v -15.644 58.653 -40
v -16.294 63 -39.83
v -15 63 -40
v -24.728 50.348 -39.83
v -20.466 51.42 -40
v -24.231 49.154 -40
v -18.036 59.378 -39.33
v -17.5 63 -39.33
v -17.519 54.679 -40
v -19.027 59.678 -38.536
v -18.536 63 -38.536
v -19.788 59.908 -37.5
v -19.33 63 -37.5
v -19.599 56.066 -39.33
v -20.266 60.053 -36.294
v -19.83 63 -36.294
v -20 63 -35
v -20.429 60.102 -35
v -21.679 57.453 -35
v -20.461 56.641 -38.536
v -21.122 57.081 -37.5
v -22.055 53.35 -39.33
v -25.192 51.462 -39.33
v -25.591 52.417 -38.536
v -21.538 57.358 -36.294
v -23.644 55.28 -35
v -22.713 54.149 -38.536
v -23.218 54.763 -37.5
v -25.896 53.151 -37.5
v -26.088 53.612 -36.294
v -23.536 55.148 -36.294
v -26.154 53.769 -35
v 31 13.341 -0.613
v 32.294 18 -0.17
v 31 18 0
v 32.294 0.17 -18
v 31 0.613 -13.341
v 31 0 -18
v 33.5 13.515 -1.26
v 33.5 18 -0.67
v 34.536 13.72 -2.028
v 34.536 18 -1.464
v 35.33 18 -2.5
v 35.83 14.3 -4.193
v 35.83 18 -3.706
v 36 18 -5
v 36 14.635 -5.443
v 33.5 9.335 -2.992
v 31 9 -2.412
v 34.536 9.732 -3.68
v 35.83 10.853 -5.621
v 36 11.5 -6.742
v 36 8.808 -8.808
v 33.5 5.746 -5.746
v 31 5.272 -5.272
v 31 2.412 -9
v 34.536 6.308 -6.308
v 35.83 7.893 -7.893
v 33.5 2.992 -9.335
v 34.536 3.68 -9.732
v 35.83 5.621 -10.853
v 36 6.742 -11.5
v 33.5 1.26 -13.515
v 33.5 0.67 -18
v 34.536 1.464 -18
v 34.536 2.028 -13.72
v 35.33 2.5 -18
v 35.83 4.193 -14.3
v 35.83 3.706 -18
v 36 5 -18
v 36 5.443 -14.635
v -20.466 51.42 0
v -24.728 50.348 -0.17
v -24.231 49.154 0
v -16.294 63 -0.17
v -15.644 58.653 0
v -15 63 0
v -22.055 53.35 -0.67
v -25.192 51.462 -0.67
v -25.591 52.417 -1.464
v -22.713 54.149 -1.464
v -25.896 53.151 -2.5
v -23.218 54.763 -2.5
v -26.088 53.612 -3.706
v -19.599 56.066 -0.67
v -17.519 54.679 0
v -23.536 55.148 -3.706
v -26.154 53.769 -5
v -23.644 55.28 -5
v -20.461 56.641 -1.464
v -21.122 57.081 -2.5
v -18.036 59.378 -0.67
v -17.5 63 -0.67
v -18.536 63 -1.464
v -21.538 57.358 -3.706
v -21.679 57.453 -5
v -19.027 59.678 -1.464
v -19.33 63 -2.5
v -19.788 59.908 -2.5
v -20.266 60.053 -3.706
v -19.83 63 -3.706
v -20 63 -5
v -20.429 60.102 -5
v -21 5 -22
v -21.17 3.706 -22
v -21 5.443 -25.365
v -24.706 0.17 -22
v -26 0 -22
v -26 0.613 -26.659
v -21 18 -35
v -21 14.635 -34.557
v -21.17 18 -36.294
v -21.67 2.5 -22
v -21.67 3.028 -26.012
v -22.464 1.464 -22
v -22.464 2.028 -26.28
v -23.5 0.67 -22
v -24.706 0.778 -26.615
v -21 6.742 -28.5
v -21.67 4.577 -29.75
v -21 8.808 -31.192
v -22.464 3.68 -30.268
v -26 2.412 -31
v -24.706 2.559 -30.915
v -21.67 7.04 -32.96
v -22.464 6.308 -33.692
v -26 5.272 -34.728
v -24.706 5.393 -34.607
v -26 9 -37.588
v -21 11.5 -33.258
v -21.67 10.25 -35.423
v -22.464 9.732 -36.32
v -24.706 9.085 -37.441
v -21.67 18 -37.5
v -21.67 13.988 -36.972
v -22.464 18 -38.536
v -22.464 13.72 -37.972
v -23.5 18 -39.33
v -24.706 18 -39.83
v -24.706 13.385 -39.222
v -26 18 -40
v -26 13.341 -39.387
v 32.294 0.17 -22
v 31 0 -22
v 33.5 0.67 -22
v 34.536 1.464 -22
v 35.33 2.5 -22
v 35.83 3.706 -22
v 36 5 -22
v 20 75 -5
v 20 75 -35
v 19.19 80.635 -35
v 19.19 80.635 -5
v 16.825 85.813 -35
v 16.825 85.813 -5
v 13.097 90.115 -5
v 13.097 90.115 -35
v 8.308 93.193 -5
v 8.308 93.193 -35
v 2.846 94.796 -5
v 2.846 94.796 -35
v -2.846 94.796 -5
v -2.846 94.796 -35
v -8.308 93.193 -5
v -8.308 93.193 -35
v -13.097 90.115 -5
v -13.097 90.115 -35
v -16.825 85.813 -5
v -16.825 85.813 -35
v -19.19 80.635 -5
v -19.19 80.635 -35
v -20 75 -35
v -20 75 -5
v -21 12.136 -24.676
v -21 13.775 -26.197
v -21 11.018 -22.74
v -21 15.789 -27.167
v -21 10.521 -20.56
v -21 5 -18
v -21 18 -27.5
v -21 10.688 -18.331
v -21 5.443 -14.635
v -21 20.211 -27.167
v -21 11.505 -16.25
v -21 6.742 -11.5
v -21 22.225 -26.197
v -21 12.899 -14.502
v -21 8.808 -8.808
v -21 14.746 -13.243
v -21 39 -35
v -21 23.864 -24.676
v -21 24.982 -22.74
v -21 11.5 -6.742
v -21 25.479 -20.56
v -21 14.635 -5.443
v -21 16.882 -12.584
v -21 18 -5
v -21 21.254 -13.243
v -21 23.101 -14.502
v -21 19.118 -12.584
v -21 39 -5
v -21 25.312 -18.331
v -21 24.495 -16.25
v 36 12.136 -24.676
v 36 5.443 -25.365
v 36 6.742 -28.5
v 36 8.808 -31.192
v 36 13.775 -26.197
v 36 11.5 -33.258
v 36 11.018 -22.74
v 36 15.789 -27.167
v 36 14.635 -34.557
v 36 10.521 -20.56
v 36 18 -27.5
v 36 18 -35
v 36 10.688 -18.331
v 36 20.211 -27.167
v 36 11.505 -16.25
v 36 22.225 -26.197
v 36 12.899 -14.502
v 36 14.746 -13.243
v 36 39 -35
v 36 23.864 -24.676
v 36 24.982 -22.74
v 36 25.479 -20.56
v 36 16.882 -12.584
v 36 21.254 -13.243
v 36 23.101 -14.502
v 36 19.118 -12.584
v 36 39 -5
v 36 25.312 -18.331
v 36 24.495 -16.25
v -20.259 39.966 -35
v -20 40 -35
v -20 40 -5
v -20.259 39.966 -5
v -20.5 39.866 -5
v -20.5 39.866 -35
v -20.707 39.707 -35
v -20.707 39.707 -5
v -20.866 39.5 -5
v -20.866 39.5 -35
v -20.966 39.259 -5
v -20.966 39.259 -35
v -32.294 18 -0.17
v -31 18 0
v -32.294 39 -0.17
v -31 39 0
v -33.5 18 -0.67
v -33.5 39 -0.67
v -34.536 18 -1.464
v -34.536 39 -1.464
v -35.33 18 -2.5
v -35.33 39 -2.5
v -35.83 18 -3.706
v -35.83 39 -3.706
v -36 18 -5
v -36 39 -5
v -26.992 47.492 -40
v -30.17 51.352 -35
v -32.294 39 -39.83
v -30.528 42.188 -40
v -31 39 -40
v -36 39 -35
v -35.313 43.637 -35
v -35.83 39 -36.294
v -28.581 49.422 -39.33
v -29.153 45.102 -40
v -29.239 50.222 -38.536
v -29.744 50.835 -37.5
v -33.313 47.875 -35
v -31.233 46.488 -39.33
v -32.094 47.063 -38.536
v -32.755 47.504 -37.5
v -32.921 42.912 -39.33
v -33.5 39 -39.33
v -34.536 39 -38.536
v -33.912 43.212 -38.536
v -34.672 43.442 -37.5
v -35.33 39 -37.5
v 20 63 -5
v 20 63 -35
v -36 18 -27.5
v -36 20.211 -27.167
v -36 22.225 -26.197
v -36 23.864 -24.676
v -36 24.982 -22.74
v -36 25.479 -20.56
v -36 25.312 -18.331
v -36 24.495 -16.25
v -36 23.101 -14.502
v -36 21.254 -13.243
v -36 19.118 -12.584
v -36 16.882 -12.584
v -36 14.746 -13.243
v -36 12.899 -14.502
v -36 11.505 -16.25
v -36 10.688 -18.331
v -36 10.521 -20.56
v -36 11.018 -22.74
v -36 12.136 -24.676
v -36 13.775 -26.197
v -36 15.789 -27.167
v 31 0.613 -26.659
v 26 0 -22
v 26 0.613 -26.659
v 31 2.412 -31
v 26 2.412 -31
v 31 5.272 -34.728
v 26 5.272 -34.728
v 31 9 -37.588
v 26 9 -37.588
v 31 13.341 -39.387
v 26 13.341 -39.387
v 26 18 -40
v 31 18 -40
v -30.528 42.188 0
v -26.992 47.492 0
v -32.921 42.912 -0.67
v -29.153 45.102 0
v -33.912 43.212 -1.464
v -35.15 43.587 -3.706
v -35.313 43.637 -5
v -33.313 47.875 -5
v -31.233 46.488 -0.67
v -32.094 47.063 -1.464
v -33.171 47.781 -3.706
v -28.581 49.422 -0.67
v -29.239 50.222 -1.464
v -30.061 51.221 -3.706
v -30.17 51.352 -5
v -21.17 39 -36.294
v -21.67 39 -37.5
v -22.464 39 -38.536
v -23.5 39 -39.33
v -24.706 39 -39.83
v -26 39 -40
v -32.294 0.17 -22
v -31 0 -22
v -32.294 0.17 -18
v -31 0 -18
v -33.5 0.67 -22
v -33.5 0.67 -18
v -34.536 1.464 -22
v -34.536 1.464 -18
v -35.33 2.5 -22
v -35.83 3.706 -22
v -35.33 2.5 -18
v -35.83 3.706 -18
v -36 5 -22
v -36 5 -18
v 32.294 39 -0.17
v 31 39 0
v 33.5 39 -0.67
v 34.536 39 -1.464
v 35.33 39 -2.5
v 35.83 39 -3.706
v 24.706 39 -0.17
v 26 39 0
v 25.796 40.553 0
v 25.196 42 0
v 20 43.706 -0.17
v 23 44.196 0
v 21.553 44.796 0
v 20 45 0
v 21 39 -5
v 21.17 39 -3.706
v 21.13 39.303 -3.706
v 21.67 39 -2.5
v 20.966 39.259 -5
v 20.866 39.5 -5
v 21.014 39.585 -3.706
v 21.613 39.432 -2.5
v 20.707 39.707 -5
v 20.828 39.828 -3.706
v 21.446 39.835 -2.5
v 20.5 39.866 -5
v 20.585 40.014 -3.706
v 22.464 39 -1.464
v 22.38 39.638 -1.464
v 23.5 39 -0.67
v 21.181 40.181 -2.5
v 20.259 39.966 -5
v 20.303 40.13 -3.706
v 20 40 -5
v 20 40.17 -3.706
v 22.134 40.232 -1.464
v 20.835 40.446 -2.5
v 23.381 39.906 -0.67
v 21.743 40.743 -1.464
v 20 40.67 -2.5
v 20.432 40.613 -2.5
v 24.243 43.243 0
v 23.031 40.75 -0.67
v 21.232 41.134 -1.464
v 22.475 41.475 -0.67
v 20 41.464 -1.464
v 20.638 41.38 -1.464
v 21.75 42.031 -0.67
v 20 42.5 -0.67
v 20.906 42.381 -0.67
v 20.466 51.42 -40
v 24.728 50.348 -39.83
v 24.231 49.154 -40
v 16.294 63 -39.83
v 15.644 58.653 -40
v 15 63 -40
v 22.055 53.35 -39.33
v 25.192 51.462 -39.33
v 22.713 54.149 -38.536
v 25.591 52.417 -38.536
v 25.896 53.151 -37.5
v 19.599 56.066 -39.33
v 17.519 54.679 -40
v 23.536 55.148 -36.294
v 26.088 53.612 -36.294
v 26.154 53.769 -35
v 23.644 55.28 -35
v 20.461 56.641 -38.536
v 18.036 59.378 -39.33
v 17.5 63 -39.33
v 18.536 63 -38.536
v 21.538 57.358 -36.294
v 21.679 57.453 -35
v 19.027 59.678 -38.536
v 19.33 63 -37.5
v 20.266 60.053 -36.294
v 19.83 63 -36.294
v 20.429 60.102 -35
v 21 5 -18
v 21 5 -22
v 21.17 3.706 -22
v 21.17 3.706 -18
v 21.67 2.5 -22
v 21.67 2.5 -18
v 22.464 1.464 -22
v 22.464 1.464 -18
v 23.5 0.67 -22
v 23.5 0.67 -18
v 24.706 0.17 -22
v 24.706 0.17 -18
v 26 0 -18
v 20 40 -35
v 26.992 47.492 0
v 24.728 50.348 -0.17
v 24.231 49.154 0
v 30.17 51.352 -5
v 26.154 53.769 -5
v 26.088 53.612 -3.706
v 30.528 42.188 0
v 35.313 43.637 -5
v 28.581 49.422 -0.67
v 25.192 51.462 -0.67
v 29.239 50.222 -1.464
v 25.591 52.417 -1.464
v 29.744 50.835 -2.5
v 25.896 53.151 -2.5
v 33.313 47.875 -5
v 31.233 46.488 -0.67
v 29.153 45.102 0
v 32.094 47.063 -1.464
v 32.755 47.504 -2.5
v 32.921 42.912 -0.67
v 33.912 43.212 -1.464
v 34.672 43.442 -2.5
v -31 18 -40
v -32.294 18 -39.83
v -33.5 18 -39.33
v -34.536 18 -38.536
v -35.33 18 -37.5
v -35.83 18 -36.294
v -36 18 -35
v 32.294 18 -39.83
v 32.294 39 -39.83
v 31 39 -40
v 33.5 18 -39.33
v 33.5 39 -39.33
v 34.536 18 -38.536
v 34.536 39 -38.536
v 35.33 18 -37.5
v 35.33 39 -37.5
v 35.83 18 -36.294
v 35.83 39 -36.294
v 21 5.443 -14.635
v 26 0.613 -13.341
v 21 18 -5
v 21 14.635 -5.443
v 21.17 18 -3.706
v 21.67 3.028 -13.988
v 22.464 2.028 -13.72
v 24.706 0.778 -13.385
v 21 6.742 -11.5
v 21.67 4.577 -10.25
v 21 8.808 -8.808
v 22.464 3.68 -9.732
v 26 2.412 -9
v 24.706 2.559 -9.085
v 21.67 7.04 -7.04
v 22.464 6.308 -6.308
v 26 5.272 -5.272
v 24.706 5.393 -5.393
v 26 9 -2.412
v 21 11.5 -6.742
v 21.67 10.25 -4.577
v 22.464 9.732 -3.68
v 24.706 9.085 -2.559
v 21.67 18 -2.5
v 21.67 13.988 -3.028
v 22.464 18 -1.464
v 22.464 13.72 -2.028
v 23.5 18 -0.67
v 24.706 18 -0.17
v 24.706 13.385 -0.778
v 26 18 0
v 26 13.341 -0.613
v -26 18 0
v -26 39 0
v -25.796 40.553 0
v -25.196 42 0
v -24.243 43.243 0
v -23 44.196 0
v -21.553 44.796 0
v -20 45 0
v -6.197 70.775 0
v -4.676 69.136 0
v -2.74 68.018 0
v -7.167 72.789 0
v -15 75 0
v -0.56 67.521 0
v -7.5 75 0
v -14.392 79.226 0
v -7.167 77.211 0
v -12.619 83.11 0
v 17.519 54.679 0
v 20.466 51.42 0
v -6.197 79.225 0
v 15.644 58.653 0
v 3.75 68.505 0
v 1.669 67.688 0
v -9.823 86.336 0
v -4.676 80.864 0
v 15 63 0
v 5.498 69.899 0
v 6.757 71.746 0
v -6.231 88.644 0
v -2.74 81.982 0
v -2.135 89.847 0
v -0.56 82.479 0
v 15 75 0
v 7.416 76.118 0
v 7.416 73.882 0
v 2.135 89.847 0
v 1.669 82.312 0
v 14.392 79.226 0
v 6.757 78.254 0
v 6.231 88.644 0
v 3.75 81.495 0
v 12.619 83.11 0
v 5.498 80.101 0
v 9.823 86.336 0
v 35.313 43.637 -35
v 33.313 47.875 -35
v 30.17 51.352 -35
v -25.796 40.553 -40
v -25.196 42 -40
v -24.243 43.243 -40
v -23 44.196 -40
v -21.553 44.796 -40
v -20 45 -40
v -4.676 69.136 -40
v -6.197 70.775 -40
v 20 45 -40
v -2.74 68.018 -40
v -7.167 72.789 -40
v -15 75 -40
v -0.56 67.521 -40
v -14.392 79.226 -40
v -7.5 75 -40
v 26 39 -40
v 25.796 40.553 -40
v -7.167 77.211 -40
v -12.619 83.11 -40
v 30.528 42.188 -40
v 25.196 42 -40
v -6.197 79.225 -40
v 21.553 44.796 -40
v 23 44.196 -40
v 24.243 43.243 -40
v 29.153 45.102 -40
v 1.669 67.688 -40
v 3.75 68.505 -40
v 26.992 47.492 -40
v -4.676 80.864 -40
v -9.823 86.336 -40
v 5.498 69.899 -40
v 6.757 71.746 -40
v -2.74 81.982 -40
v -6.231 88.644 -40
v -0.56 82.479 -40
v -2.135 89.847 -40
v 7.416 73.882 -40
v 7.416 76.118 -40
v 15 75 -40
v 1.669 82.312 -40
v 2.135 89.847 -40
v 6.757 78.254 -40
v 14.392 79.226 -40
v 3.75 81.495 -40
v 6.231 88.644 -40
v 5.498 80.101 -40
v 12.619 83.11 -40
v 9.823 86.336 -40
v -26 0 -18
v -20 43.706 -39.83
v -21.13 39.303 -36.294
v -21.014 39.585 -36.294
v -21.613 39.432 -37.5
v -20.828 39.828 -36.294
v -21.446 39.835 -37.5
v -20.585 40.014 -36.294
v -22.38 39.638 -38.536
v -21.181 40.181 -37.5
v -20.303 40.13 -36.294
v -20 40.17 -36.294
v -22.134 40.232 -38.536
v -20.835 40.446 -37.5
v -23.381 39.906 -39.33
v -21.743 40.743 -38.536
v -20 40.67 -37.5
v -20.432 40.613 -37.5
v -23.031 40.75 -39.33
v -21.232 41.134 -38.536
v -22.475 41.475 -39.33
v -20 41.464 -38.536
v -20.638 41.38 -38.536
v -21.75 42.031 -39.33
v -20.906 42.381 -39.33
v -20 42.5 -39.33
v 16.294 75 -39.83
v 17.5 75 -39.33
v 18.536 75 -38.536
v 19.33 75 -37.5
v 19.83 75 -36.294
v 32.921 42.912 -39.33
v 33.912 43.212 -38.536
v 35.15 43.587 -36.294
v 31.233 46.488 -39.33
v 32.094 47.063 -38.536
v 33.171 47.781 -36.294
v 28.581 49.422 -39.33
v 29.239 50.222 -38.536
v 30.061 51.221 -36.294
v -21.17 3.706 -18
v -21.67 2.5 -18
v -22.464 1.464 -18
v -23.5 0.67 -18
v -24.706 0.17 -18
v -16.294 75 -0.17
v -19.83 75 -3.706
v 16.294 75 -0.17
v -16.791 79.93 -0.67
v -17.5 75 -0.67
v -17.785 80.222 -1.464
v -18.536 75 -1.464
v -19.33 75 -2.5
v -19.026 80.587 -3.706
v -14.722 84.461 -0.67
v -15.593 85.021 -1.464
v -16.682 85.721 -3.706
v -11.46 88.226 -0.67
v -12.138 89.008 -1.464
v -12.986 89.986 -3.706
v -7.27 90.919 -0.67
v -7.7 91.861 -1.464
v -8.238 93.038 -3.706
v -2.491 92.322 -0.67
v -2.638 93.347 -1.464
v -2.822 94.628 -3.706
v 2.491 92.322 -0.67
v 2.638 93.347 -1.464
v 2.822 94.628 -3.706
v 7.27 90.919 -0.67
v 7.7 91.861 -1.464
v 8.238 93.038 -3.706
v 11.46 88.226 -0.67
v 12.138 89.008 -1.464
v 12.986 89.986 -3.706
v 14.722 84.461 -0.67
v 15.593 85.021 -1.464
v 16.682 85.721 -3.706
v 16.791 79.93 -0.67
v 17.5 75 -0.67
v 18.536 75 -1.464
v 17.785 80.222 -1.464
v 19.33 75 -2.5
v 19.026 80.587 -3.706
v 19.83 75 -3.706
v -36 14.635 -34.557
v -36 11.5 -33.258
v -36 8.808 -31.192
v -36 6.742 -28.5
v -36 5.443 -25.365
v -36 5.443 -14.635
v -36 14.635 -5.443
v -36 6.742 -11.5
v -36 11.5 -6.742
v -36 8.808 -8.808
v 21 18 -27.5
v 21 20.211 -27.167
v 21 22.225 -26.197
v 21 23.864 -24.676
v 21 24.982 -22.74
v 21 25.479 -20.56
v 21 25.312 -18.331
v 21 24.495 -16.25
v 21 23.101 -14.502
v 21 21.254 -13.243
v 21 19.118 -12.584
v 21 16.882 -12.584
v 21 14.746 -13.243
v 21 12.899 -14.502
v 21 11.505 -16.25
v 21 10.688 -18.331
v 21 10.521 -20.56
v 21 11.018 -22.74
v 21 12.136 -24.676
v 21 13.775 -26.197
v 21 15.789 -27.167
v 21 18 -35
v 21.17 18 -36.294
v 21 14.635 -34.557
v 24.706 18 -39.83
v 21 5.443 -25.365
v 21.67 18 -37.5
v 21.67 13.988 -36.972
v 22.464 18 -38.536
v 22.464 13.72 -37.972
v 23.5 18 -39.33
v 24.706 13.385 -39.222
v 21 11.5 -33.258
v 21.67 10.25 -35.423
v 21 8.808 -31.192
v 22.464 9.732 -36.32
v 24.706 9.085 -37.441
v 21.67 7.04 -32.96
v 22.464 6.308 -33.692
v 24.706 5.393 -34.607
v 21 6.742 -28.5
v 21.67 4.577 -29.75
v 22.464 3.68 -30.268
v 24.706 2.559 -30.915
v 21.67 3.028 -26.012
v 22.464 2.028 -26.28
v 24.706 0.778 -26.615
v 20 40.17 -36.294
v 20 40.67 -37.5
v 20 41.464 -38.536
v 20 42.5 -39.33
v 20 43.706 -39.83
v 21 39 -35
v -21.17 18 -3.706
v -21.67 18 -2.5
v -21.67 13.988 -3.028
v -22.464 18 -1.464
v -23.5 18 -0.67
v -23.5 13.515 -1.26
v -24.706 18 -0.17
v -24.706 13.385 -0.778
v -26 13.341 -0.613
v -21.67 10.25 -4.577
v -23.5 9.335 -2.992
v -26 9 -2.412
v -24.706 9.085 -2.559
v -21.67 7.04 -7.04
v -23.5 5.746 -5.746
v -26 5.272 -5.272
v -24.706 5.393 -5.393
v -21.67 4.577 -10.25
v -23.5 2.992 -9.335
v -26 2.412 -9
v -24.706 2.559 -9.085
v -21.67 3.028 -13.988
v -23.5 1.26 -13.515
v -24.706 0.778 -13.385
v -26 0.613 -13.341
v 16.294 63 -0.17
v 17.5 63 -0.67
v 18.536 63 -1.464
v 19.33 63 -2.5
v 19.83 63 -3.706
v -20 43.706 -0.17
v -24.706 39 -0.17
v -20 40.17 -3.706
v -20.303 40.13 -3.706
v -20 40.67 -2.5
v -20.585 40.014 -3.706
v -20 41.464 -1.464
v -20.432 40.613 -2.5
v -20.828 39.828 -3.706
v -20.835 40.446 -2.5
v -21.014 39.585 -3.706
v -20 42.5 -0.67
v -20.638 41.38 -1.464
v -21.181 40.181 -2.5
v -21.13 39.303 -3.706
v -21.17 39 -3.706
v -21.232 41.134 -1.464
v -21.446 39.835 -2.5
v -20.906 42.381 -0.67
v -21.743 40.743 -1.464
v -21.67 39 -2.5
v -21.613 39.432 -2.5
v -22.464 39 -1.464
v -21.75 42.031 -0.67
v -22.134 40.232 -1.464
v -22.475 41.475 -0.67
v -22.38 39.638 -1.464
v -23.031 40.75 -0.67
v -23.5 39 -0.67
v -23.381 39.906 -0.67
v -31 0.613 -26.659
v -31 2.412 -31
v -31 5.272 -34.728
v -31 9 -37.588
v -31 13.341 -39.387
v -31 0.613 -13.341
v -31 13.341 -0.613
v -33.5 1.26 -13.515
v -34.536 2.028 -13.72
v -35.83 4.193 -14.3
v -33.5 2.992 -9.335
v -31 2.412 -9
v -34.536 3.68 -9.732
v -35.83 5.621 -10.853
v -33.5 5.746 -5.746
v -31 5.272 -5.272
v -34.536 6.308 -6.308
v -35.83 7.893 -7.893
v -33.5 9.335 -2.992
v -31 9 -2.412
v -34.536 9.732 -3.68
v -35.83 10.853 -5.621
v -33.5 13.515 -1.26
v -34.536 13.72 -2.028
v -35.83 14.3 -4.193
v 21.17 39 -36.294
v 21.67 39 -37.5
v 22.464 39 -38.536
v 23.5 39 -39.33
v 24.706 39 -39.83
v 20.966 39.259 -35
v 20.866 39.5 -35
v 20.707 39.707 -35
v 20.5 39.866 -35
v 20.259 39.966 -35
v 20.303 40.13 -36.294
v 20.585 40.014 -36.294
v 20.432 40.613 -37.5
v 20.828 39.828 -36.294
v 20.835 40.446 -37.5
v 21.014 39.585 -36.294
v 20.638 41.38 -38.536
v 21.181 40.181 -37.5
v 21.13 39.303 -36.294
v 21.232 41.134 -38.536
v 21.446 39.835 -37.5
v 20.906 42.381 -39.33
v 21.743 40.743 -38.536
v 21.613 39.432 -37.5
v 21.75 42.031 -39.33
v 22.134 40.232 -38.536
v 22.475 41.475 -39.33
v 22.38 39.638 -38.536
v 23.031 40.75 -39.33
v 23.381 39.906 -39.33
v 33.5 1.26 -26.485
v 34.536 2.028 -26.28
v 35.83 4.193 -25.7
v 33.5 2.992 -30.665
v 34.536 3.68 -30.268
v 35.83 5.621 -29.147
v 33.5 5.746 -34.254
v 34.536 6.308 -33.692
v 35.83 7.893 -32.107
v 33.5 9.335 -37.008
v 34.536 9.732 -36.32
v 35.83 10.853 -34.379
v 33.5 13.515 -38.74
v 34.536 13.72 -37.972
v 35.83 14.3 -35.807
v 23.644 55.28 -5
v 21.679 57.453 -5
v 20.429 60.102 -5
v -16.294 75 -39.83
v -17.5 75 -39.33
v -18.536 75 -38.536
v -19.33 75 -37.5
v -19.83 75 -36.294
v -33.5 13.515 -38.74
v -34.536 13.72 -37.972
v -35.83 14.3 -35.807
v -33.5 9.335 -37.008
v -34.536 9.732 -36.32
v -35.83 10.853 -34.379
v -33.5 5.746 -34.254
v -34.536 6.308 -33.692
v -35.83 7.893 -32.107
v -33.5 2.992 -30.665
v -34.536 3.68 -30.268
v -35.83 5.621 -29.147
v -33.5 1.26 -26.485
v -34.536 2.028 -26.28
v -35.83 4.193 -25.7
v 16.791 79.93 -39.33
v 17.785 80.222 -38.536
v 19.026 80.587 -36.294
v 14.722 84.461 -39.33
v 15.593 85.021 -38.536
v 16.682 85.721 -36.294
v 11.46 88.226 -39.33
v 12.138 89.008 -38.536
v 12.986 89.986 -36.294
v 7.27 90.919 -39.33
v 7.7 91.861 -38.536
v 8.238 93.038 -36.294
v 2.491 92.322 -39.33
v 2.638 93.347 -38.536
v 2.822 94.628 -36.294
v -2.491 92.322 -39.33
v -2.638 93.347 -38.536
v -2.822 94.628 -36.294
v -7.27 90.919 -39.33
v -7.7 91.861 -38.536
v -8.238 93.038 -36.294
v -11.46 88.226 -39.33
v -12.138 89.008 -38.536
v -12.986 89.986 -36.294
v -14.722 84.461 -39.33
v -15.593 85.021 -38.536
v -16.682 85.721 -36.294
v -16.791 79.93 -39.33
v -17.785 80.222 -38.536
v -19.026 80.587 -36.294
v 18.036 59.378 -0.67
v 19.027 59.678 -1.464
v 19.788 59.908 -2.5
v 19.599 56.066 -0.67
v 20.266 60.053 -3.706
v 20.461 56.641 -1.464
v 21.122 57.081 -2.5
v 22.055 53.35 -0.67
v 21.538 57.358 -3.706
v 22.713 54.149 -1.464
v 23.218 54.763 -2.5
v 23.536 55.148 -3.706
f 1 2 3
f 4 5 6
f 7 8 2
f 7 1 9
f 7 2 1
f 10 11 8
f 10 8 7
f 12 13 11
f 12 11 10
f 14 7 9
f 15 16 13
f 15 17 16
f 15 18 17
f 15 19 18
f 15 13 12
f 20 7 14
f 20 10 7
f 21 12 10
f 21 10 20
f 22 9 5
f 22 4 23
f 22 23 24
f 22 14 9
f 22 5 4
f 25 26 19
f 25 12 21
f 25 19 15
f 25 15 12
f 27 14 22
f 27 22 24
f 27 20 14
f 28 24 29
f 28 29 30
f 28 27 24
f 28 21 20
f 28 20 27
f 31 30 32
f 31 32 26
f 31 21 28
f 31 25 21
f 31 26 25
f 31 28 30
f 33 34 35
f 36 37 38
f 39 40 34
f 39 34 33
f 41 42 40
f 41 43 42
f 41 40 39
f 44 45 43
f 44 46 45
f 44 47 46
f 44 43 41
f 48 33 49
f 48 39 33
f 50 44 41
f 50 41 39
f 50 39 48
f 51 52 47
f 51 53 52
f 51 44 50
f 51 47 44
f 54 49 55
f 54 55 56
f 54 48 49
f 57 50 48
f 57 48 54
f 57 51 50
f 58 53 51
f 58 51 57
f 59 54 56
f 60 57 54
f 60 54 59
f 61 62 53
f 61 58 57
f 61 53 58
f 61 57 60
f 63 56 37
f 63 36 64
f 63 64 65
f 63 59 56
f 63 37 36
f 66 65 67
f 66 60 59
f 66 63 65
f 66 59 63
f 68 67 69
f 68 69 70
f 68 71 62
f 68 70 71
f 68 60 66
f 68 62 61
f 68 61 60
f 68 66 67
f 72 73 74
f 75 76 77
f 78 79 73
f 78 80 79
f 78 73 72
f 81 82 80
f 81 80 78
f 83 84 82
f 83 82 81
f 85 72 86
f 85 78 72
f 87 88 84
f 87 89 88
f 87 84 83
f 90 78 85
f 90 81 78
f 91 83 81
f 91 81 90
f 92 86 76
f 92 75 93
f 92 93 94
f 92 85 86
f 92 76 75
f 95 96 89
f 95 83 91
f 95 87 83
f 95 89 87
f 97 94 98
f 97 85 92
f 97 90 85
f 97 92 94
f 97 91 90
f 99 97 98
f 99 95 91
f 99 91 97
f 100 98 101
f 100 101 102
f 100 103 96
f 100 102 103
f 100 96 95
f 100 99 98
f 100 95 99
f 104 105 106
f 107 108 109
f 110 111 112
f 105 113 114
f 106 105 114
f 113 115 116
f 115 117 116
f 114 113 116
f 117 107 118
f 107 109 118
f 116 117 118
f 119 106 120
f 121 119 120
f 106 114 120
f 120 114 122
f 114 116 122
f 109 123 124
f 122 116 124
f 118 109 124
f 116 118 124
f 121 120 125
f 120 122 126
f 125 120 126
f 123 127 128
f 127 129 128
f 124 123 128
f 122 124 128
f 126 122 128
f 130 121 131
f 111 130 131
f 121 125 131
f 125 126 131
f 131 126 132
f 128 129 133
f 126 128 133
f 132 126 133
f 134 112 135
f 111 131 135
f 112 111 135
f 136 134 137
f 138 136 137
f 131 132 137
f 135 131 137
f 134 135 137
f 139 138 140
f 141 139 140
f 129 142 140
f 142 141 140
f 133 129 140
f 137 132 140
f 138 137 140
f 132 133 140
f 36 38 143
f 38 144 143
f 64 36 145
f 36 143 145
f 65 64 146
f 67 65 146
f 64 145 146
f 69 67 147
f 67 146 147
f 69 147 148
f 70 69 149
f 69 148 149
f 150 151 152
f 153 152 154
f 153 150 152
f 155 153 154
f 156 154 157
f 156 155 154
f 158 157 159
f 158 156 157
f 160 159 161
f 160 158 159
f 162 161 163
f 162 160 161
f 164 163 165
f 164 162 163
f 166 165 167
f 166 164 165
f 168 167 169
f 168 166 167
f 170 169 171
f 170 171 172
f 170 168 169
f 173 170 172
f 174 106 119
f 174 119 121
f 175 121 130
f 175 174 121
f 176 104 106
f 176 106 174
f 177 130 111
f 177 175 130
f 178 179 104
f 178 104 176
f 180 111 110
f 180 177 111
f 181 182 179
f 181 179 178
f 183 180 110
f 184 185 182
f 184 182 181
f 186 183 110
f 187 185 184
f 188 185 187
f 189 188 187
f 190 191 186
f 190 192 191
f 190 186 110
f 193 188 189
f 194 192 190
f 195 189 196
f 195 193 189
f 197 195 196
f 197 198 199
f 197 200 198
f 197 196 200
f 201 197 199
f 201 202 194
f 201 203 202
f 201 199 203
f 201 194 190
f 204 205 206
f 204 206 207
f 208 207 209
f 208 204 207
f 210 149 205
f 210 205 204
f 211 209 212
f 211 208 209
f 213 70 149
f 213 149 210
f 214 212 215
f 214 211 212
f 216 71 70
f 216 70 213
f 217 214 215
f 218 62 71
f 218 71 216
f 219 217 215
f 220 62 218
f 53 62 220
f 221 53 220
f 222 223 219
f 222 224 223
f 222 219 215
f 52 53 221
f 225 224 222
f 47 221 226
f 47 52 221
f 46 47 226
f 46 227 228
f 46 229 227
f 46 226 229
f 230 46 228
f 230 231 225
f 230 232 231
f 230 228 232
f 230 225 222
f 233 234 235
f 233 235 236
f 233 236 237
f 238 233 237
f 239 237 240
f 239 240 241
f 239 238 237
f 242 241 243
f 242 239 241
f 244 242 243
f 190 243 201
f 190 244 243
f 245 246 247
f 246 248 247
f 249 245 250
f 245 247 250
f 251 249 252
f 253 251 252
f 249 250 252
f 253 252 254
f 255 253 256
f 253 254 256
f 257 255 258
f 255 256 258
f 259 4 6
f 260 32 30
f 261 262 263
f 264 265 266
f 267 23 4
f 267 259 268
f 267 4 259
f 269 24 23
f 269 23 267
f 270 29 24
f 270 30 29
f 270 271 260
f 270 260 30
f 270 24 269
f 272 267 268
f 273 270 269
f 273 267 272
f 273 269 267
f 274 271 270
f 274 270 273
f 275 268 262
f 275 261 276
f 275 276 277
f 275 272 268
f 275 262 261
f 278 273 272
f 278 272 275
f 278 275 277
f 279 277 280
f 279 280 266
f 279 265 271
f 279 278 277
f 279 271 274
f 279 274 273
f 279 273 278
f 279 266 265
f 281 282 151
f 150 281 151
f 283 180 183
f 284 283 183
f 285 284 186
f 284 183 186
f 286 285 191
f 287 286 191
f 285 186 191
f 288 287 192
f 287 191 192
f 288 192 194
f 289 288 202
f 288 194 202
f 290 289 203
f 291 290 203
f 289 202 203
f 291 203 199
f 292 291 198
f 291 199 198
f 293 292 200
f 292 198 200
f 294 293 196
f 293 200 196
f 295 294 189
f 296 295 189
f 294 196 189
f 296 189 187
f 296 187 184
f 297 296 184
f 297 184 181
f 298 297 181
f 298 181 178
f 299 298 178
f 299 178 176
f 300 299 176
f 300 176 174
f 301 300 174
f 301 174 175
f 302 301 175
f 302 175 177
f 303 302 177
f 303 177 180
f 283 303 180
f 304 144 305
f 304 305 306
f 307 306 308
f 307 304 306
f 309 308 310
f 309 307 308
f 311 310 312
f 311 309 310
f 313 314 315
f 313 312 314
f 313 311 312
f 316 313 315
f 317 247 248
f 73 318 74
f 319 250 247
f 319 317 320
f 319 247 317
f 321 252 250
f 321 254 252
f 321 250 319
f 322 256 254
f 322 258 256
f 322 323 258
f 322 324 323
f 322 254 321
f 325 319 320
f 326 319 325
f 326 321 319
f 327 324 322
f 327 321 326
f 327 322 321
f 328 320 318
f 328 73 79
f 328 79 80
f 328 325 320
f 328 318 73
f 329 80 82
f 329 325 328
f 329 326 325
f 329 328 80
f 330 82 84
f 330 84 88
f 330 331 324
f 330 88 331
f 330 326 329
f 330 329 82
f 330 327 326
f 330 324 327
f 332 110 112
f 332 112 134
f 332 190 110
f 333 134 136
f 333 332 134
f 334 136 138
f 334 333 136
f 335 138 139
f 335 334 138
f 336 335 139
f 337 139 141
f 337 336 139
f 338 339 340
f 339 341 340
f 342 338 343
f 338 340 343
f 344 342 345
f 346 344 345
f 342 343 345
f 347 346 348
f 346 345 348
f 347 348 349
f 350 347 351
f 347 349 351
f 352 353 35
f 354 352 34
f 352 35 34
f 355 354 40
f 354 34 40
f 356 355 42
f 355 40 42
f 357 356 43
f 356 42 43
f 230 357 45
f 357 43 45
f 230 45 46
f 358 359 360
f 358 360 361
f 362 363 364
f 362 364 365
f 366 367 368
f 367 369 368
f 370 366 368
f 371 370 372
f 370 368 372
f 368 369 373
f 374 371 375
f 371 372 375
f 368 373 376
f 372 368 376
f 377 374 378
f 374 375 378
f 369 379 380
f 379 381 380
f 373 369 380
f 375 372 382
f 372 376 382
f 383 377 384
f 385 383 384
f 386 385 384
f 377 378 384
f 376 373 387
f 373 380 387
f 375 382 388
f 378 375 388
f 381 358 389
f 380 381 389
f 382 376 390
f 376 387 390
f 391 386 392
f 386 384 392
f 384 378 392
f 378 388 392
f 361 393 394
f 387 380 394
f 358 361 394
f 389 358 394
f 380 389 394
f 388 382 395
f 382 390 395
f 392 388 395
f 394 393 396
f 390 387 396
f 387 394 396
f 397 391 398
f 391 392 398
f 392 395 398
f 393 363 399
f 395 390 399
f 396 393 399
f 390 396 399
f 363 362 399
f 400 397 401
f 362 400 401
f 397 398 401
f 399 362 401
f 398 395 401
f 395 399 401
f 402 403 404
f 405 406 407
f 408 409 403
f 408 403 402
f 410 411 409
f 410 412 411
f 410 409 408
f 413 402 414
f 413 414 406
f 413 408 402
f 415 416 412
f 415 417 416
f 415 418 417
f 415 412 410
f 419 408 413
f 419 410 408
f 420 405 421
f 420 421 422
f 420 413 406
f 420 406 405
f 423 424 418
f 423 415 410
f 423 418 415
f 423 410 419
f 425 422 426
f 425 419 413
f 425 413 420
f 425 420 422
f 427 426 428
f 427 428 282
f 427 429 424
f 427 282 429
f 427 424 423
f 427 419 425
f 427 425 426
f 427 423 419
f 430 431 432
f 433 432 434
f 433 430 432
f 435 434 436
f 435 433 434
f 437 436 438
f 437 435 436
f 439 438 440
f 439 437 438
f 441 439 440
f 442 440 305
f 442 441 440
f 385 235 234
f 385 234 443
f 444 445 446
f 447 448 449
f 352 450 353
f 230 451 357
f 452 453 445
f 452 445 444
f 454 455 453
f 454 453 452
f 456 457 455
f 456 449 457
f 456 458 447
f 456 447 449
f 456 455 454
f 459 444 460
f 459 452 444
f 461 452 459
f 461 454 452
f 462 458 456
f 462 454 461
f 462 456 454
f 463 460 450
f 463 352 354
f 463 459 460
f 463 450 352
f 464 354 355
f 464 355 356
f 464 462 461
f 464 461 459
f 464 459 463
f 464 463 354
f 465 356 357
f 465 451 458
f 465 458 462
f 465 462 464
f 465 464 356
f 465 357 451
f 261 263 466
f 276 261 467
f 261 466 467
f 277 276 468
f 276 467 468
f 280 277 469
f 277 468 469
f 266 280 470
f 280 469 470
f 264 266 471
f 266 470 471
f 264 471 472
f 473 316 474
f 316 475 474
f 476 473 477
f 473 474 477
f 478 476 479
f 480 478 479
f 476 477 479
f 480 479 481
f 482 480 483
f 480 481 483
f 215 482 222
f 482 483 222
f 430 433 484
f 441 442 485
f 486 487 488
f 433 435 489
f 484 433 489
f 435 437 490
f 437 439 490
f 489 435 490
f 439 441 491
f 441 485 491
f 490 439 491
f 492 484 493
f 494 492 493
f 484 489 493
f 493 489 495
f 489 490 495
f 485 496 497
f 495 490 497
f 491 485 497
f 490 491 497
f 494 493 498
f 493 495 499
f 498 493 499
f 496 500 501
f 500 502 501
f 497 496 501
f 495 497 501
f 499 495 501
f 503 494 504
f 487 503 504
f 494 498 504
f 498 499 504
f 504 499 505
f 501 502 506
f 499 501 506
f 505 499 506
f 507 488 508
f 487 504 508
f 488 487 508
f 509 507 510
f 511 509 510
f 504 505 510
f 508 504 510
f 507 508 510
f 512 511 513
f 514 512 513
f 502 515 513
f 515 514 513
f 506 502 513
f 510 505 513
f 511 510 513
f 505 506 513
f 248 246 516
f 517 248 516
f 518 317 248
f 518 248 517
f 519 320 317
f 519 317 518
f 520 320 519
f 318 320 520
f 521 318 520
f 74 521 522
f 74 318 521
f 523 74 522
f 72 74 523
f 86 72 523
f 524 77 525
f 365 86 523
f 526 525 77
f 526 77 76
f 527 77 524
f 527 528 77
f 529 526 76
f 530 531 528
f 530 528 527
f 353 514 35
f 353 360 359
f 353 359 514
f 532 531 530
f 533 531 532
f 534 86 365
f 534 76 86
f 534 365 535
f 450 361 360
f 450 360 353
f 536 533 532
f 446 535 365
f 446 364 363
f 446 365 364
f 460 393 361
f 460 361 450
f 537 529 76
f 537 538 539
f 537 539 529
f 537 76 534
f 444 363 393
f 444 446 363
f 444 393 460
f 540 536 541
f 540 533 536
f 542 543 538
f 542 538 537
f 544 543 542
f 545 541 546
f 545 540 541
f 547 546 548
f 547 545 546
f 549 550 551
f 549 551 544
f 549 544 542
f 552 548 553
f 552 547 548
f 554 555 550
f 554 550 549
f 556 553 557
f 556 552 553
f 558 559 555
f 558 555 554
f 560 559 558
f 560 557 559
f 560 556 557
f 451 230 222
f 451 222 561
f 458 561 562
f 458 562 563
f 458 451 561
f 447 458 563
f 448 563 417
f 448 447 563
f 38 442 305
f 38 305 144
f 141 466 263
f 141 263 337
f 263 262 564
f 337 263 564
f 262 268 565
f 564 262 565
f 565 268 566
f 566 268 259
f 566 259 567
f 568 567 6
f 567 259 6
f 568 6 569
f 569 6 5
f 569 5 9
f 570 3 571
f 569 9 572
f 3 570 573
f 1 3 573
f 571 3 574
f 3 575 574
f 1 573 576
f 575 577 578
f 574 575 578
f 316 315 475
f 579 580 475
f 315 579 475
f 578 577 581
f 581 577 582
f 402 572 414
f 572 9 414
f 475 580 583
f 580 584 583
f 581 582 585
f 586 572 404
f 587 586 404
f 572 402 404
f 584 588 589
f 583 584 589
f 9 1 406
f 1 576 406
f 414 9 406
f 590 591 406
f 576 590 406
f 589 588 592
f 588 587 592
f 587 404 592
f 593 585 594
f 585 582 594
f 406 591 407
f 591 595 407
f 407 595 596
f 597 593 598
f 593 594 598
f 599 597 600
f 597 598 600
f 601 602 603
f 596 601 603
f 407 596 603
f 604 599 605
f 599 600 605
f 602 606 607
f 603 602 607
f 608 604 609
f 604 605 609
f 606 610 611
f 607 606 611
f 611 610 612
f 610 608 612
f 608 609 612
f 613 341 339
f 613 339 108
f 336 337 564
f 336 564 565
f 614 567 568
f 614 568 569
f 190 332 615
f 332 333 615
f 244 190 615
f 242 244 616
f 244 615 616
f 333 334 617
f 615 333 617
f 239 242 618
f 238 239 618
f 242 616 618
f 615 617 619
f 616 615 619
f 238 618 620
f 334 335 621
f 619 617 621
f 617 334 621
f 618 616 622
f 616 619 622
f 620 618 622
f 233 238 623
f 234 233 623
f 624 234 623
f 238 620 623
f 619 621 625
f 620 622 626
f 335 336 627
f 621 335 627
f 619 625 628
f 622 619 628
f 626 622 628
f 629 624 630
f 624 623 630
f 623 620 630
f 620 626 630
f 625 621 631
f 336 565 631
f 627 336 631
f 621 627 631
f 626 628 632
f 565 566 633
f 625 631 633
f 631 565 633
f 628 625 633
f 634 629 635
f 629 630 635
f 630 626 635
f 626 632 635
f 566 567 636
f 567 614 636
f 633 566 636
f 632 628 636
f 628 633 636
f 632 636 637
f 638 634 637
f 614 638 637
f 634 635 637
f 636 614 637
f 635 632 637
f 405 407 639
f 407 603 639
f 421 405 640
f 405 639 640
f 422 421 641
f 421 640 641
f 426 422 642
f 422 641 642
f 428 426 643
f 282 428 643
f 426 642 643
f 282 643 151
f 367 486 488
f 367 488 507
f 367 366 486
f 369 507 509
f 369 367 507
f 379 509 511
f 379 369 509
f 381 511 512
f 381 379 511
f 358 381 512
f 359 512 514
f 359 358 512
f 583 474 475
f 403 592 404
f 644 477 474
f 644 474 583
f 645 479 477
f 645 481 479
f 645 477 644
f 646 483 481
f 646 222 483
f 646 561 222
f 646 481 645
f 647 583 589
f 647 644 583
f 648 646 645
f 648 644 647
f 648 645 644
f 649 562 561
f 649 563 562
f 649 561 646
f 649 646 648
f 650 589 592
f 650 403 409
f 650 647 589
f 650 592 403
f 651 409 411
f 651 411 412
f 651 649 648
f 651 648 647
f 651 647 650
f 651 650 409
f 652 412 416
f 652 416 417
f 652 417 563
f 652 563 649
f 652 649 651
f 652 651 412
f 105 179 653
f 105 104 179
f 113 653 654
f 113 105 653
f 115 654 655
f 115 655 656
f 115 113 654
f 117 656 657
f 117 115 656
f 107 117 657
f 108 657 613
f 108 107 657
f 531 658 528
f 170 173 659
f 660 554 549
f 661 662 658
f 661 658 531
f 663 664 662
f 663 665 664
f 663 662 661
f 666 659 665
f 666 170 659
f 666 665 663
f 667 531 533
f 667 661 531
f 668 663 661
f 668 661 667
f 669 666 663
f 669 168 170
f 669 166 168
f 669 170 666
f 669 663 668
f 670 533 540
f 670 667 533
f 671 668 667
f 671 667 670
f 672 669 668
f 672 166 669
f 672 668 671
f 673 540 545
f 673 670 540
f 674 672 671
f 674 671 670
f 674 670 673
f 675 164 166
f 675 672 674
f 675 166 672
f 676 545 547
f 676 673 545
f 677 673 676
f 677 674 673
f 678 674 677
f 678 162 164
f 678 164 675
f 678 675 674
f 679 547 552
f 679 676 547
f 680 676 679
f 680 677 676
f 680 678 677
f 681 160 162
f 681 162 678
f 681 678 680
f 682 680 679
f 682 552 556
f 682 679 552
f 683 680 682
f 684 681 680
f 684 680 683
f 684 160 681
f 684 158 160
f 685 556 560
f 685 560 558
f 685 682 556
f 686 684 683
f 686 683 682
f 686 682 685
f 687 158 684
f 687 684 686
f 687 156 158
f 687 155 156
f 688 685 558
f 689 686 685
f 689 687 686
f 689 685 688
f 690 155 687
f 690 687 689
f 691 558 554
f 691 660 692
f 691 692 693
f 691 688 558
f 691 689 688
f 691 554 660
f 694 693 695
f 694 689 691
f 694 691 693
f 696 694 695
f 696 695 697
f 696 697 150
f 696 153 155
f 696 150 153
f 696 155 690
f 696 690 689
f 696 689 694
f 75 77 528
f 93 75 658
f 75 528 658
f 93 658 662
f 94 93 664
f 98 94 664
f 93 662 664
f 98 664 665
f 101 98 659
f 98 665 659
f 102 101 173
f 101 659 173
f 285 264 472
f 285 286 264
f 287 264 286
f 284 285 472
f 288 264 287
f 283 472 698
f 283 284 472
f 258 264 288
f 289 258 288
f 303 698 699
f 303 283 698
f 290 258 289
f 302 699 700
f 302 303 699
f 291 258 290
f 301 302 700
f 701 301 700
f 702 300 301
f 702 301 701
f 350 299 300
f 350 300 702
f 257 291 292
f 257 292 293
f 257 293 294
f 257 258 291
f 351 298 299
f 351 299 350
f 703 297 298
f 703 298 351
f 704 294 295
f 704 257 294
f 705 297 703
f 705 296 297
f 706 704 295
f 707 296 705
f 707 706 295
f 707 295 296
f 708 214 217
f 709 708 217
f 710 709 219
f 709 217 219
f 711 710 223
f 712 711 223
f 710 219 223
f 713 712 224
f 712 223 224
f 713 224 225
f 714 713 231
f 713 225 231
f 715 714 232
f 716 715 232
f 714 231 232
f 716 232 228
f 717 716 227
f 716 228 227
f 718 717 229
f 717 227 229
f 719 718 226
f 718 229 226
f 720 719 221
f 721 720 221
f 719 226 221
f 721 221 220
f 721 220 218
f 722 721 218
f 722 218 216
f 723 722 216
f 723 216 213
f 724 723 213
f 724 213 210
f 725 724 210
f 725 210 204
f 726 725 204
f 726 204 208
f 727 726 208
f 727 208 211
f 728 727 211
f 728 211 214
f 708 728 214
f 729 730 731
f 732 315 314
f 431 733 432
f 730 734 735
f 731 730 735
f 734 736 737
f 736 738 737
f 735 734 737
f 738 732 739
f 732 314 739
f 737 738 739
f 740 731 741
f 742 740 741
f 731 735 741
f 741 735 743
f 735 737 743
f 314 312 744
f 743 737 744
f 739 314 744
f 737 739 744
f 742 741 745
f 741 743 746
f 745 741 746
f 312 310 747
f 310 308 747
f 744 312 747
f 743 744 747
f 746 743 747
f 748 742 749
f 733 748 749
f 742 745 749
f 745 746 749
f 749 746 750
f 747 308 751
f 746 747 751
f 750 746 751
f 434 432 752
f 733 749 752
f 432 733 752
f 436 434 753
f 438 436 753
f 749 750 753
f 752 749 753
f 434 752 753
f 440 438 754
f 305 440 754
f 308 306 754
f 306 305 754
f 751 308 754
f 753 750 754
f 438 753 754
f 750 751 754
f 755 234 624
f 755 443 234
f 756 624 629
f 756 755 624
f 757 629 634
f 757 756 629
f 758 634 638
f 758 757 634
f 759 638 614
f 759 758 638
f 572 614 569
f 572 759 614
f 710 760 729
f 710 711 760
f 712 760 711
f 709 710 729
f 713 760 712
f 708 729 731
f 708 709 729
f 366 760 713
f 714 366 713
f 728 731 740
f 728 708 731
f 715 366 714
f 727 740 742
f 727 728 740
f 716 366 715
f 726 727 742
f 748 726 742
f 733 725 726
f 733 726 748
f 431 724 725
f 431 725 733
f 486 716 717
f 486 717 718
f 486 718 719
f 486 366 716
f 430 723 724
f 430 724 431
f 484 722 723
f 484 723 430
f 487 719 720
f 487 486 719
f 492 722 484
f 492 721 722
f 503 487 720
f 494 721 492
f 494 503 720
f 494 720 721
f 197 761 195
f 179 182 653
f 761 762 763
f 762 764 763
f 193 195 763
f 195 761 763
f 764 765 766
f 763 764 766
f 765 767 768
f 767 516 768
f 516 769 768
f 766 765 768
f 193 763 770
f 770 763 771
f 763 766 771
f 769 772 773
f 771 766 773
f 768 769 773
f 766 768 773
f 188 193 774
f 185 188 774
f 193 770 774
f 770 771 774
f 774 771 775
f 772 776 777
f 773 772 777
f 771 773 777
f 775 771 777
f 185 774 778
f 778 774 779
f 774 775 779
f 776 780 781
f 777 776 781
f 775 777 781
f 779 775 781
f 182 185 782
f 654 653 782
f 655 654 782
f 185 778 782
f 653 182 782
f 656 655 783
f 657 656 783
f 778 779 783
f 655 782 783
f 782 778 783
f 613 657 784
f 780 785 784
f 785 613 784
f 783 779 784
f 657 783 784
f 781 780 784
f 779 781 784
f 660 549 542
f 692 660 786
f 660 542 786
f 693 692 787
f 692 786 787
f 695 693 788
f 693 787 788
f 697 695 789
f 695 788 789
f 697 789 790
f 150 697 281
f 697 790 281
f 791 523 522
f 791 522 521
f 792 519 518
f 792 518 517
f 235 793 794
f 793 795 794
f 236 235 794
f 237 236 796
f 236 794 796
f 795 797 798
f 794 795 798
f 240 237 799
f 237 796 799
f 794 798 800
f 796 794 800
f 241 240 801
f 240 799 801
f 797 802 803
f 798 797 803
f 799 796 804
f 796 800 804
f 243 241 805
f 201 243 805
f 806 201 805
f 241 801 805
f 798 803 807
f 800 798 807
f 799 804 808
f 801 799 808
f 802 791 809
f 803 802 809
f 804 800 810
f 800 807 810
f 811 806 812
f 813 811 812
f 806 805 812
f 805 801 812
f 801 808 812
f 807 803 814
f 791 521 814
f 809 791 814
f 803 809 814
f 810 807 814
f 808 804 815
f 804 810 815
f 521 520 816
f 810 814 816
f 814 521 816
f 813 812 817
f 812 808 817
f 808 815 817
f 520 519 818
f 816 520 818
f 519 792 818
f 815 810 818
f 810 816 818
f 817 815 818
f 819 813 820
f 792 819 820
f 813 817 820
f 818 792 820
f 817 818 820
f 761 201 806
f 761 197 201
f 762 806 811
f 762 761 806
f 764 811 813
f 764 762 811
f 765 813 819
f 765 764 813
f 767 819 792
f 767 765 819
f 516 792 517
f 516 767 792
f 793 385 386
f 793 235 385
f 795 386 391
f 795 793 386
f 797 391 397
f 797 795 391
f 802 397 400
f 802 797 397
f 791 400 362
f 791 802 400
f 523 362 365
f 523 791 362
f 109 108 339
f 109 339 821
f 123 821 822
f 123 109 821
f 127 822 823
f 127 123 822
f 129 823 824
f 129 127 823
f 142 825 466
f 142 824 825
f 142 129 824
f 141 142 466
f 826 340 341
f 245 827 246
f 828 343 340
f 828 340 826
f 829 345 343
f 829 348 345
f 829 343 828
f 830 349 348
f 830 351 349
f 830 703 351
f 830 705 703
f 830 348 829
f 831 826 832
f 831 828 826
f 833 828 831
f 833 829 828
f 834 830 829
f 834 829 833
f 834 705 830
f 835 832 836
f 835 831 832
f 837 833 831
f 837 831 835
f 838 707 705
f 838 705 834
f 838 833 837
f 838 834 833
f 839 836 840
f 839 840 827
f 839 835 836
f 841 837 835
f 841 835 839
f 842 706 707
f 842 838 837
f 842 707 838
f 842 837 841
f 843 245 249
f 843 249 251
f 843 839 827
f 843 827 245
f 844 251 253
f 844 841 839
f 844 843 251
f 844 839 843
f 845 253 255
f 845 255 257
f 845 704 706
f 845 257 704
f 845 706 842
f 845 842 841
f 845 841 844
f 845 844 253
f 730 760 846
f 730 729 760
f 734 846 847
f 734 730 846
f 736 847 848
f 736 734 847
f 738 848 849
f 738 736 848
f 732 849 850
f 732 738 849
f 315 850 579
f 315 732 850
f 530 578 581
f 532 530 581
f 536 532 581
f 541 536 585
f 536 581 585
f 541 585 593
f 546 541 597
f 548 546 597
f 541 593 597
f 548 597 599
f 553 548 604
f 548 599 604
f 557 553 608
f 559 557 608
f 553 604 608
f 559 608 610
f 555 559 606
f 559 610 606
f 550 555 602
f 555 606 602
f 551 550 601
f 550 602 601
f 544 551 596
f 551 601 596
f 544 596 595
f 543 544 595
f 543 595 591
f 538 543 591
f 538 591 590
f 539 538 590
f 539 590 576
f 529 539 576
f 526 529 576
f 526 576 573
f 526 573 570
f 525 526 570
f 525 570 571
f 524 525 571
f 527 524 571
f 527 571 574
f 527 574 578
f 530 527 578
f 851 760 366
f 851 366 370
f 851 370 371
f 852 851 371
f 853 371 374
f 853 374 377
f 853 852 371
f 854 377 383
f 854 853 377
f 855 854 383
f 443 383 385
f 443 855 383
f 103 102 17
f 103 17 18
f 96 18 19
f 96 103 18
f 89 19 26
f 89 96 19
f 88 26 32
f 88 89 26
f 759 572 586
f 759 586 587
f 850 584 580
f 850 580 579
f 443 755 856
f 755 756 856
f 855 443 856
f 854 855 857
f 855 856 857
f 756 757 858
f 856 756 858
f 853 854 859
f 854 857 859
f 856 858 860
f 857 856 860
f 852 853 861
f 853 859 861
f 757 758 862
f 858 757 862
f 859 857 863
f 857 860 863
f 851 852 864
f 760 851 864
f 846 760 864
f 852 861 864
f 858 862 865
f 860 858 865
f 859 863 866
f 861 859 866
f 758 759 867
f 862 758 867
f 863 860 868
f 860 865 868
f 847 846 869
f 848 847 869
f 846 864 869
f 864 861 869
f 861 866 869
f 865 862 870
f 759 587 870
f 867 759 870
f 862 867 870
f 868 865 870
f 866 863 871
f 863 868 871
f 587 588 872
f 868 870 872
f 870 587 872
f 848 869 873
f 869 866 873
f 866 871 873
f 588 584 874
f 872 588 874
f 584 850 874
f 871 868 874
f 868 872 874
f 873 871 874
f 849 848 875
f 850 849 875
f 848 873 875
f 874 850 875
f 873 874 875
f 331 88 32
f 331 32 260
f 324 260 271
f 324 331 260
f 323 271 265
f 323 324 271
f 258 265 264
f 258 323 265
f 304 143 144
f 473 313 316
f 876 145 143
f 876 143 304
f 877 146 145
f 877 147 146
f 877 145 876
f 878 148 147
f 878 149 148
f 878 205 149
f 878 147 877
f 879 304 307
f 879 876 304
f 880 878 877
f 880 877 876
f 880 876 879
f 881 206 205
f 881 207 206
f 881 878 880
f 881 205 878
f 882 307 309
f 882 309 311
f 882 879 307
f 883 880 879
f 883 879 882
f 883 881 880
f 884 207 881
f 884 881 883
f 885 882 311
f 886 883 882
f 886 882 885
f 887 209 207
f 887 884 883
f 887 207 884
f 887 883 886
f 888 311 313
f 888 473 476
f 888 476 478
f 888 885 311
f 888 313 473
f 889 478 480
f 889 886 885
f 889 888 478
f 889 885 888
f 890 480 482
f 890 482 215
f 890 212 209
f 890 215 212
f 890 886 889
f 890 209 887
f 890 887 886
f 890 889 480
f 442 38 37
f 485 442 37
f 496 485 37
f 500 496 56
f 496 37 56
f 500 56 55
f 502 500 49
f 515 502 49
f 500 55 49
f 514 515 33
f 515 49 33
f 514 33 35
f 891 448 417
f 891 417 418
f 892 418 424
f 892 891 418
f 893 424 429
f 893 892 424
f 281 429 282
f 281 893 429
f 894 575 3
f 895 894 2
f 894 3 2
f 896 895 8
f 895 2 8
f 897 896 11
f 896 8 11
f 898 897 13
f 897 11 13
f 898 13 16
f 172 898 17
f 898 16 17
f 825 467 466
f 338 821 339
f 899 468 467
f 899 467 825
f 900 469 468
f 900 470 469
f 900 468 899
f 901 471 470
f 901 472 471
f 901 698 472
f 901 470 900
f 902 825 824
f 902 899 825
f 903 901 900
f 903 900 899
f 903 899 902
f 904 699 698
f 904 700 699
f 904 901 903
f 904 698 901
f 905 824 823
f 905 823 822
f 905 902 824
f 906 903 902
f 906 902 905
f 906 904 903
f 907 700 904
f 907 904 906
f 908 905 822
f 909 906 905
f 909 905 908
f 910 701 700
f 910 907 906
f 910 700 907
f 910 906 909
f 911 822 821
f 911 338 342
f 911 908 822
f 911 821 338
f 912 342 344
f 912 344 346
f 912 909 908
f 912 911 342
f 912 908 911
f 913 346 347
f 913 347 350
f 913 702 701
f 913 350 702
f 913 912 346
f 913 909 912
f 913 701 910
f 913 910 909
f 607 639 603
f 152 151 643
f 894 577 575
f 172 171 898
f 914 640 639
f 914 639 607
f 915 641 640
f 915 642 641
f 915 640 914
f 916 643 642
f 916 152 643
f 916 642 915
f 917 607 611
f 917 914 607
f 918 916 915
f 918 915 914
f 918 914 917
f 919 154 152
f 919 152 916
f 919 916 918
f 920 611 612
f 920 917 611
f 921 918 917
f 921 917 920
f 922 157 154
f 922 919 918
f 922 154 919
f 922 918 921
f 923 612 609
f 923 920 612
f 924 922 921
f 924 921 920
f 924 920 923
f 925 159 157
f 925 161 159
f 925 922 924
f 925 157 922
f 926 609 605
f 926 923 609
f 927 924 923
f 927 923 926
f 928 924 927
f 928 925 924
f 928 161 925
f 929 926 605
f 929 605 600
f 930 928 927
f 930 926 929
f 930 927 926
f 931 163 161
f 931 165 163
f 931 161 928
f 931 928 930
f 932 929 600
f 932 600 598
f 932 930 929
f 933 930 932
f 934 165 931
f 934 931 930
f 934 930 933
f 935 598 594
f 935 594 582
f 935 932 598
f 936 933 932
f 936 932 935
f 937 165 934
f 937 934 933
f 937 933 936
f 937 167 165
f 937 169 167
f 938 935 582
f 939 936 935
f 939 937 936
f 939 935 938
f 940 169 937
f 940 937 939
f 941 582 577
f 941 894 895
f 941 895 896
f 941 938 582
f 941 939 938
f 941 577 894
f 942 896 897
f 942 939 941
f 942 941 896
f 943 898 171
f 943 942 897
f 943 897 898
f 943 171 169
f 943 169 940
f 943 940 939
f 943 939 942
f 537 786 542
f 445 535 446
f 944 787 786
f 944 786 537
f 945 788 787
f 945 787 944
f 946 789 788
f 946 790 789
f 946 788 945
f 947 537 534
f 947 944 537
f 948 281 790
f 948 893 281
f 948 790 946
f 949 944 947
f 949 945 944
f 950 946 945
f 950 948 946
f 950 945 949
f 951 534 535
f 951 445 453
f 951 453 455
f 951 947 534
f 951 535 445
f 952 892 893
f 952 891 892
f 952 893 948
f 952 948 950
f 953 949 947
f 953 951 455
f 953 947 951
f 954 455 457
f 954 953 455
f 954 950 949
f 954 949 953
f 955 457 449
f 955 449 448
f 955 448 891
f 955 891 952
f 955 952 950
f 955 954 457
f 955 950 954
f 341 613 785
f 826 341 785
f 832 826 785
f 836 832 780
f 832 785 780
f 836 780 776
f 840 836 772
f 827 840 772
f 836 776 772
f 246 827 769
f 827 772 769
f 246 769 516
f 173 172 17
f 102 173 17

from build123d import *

# Parameters (mm, degrees)
BOSS_EXTRUDE2_DEPTH = 40
FILLET4_R           = 18
SKETCH8_R           = 7.5
CUT_EXTRUDE3_DEPTH  = 73
SKETCH9_R           = 7.5
CUT_EXTRUDE4_DEPTH  = 41
FILLET5_R           = 1
FILLET6_R           = 5


with BuildPart() as part:
    # Sketch7 → Boss-Extrude2 (new body)
    with BuildSketch(Plane.XY):
        with BuildLine():
            Line((-21, 40), (21, 40))
            Line((21, 40), (21, 0))
            Line((21, 0), (36, 0))
            Line((36, 0), (36, 39))
            ThreePointArc((36, 39), (33.312804709, 47.87520314), (26.153846154, 53.769230769))
            ThreePointArc((26.153846154, 53.769230769), (21.679497057, 57.452998038), (20, 63))
            Line((20, 63), (20, 75))
            ThreePointArc((20, 75), (0, 95), (-20, 75))
            Line((-20, 75), (-20, 63))
            ThreePointArc((-20, 63), (-21.679497057, 57.452998038), (-26.153846154, 53.769230769))
            ThreePointArc((-26.153846154, 53.769230769), (-33.312804709, 47.87520314), (-36, 39))
            Line((-36, 39), (-36, 0))
            Line((-36, 0), (-21, 0))
            Line((-21, 0), (-21, 40))
        make_face()
    extrude(amount=-BOSS_EXTRUDE2_DEPTH)

    # Fillet4
    fillet4_edges = [part.edges().sort_by_distance(p)[0] for p in [
        (28.5, 0, 0),
        (-28.5, 0, 0),
        (-28.5, 0, -40),
        (28.5, 0, -40),
    ]]
    fillet(fillet4_edges, radius=FILLET4_R)

    # Sketch8 → Cut-Extrude3 (cut, through all)
    with BuildSketch(Plane(origin=(36, 0, 0), x_dir=(0, 0, -1), z_dir=(1, 0, 0))):
        with Locations((20, 18)):
            Circle(SKETCH8_R)
    extrude(amount=-CUT_EXTRUDE3_DEPTH, mode=Mode.SUBTRACT)

    # Sketch9 → Cut-Extrude4 (cut, through all)
    with BuildSketch(Plane(origin=(0, 0, -40), x_dir=(-1, 0, 0), z_dir=(0, 0, -1))):
        with Locations((0, 75)):
            Circle(SKETCH9_R)
    extrude(amount=-CUT_EXTRUDE4_DEPTH, mode=Mode.SUBTRACT)

    # Fillet5
    fillet5_edges = [part.edges().sort_by_distance(p)[0] for p in [
        (21, 40, -20),
        (-21, 40, -20),
    ]]
    fillet(fillet5_edges, radius=FILLET5_R)

    # Fillet6
    fillet6_edges = [part.edges().sort_by_distance(p)[0] for p in [
        (20, 69, -40),
        (0, 95, -40),
        (-36, 28.5, 0),
        (-33.312804709, 47.87520314, 0),
        (-21.679497057, 57.452998038, 0),
        (-20, 69, -40),
        (-20, 69, 0),
        (0, 95, 0),
        (20, 69, 0),
        (21.679497057, 57.452998038, 0),
        (33.312804709, 47.87520314, 0),
        (-21.679497057, 57.452998038, -40),
        (-33.312804709, 47.87520314, -40),
        (-36, 28.5, -40),
        (33.312804709, 47.87520314, -40),
        (-36, 0, -20),
        (-21, 0, -20),
        (-21, 28.5, 0),
        (-21, 28.5, -40),
        (-21, 5.272077939, -5.272077939),
        (-21, 5.272077939, -34.727922061),
        (36, 28.5, -40),
        (-36, 5.272077939, -5.272077939),
        (-36, 5.272077939, -34.727922061),
        (21, 0, -20),
        (36, 0, -20),
        (36, 28.5, 0),
        (36, 5.272077939, -5.272077939),
        (36, 5.272077939, -34.727922061),
        (21, 5.272077939, -5.272077939),
        (21, 5.272077939, -34.727922061),
        (21.679497057, 57.452998038, -40),
        (0, 40, 0),
        (0, 40, -40),
        (21, 28.5, -40),
        (21, 28.5, 0),
        (-20.707106781, 39.707106781, 0),
        (-20.707106781, 39.707106781, -40),
        (20.707106781, 39.707106781, 0),
        (20.707106781, 39.707106781, -40),
    ]]
    fillet(fillet6_edges, radius=FILLET6_R)


solid = part.part
